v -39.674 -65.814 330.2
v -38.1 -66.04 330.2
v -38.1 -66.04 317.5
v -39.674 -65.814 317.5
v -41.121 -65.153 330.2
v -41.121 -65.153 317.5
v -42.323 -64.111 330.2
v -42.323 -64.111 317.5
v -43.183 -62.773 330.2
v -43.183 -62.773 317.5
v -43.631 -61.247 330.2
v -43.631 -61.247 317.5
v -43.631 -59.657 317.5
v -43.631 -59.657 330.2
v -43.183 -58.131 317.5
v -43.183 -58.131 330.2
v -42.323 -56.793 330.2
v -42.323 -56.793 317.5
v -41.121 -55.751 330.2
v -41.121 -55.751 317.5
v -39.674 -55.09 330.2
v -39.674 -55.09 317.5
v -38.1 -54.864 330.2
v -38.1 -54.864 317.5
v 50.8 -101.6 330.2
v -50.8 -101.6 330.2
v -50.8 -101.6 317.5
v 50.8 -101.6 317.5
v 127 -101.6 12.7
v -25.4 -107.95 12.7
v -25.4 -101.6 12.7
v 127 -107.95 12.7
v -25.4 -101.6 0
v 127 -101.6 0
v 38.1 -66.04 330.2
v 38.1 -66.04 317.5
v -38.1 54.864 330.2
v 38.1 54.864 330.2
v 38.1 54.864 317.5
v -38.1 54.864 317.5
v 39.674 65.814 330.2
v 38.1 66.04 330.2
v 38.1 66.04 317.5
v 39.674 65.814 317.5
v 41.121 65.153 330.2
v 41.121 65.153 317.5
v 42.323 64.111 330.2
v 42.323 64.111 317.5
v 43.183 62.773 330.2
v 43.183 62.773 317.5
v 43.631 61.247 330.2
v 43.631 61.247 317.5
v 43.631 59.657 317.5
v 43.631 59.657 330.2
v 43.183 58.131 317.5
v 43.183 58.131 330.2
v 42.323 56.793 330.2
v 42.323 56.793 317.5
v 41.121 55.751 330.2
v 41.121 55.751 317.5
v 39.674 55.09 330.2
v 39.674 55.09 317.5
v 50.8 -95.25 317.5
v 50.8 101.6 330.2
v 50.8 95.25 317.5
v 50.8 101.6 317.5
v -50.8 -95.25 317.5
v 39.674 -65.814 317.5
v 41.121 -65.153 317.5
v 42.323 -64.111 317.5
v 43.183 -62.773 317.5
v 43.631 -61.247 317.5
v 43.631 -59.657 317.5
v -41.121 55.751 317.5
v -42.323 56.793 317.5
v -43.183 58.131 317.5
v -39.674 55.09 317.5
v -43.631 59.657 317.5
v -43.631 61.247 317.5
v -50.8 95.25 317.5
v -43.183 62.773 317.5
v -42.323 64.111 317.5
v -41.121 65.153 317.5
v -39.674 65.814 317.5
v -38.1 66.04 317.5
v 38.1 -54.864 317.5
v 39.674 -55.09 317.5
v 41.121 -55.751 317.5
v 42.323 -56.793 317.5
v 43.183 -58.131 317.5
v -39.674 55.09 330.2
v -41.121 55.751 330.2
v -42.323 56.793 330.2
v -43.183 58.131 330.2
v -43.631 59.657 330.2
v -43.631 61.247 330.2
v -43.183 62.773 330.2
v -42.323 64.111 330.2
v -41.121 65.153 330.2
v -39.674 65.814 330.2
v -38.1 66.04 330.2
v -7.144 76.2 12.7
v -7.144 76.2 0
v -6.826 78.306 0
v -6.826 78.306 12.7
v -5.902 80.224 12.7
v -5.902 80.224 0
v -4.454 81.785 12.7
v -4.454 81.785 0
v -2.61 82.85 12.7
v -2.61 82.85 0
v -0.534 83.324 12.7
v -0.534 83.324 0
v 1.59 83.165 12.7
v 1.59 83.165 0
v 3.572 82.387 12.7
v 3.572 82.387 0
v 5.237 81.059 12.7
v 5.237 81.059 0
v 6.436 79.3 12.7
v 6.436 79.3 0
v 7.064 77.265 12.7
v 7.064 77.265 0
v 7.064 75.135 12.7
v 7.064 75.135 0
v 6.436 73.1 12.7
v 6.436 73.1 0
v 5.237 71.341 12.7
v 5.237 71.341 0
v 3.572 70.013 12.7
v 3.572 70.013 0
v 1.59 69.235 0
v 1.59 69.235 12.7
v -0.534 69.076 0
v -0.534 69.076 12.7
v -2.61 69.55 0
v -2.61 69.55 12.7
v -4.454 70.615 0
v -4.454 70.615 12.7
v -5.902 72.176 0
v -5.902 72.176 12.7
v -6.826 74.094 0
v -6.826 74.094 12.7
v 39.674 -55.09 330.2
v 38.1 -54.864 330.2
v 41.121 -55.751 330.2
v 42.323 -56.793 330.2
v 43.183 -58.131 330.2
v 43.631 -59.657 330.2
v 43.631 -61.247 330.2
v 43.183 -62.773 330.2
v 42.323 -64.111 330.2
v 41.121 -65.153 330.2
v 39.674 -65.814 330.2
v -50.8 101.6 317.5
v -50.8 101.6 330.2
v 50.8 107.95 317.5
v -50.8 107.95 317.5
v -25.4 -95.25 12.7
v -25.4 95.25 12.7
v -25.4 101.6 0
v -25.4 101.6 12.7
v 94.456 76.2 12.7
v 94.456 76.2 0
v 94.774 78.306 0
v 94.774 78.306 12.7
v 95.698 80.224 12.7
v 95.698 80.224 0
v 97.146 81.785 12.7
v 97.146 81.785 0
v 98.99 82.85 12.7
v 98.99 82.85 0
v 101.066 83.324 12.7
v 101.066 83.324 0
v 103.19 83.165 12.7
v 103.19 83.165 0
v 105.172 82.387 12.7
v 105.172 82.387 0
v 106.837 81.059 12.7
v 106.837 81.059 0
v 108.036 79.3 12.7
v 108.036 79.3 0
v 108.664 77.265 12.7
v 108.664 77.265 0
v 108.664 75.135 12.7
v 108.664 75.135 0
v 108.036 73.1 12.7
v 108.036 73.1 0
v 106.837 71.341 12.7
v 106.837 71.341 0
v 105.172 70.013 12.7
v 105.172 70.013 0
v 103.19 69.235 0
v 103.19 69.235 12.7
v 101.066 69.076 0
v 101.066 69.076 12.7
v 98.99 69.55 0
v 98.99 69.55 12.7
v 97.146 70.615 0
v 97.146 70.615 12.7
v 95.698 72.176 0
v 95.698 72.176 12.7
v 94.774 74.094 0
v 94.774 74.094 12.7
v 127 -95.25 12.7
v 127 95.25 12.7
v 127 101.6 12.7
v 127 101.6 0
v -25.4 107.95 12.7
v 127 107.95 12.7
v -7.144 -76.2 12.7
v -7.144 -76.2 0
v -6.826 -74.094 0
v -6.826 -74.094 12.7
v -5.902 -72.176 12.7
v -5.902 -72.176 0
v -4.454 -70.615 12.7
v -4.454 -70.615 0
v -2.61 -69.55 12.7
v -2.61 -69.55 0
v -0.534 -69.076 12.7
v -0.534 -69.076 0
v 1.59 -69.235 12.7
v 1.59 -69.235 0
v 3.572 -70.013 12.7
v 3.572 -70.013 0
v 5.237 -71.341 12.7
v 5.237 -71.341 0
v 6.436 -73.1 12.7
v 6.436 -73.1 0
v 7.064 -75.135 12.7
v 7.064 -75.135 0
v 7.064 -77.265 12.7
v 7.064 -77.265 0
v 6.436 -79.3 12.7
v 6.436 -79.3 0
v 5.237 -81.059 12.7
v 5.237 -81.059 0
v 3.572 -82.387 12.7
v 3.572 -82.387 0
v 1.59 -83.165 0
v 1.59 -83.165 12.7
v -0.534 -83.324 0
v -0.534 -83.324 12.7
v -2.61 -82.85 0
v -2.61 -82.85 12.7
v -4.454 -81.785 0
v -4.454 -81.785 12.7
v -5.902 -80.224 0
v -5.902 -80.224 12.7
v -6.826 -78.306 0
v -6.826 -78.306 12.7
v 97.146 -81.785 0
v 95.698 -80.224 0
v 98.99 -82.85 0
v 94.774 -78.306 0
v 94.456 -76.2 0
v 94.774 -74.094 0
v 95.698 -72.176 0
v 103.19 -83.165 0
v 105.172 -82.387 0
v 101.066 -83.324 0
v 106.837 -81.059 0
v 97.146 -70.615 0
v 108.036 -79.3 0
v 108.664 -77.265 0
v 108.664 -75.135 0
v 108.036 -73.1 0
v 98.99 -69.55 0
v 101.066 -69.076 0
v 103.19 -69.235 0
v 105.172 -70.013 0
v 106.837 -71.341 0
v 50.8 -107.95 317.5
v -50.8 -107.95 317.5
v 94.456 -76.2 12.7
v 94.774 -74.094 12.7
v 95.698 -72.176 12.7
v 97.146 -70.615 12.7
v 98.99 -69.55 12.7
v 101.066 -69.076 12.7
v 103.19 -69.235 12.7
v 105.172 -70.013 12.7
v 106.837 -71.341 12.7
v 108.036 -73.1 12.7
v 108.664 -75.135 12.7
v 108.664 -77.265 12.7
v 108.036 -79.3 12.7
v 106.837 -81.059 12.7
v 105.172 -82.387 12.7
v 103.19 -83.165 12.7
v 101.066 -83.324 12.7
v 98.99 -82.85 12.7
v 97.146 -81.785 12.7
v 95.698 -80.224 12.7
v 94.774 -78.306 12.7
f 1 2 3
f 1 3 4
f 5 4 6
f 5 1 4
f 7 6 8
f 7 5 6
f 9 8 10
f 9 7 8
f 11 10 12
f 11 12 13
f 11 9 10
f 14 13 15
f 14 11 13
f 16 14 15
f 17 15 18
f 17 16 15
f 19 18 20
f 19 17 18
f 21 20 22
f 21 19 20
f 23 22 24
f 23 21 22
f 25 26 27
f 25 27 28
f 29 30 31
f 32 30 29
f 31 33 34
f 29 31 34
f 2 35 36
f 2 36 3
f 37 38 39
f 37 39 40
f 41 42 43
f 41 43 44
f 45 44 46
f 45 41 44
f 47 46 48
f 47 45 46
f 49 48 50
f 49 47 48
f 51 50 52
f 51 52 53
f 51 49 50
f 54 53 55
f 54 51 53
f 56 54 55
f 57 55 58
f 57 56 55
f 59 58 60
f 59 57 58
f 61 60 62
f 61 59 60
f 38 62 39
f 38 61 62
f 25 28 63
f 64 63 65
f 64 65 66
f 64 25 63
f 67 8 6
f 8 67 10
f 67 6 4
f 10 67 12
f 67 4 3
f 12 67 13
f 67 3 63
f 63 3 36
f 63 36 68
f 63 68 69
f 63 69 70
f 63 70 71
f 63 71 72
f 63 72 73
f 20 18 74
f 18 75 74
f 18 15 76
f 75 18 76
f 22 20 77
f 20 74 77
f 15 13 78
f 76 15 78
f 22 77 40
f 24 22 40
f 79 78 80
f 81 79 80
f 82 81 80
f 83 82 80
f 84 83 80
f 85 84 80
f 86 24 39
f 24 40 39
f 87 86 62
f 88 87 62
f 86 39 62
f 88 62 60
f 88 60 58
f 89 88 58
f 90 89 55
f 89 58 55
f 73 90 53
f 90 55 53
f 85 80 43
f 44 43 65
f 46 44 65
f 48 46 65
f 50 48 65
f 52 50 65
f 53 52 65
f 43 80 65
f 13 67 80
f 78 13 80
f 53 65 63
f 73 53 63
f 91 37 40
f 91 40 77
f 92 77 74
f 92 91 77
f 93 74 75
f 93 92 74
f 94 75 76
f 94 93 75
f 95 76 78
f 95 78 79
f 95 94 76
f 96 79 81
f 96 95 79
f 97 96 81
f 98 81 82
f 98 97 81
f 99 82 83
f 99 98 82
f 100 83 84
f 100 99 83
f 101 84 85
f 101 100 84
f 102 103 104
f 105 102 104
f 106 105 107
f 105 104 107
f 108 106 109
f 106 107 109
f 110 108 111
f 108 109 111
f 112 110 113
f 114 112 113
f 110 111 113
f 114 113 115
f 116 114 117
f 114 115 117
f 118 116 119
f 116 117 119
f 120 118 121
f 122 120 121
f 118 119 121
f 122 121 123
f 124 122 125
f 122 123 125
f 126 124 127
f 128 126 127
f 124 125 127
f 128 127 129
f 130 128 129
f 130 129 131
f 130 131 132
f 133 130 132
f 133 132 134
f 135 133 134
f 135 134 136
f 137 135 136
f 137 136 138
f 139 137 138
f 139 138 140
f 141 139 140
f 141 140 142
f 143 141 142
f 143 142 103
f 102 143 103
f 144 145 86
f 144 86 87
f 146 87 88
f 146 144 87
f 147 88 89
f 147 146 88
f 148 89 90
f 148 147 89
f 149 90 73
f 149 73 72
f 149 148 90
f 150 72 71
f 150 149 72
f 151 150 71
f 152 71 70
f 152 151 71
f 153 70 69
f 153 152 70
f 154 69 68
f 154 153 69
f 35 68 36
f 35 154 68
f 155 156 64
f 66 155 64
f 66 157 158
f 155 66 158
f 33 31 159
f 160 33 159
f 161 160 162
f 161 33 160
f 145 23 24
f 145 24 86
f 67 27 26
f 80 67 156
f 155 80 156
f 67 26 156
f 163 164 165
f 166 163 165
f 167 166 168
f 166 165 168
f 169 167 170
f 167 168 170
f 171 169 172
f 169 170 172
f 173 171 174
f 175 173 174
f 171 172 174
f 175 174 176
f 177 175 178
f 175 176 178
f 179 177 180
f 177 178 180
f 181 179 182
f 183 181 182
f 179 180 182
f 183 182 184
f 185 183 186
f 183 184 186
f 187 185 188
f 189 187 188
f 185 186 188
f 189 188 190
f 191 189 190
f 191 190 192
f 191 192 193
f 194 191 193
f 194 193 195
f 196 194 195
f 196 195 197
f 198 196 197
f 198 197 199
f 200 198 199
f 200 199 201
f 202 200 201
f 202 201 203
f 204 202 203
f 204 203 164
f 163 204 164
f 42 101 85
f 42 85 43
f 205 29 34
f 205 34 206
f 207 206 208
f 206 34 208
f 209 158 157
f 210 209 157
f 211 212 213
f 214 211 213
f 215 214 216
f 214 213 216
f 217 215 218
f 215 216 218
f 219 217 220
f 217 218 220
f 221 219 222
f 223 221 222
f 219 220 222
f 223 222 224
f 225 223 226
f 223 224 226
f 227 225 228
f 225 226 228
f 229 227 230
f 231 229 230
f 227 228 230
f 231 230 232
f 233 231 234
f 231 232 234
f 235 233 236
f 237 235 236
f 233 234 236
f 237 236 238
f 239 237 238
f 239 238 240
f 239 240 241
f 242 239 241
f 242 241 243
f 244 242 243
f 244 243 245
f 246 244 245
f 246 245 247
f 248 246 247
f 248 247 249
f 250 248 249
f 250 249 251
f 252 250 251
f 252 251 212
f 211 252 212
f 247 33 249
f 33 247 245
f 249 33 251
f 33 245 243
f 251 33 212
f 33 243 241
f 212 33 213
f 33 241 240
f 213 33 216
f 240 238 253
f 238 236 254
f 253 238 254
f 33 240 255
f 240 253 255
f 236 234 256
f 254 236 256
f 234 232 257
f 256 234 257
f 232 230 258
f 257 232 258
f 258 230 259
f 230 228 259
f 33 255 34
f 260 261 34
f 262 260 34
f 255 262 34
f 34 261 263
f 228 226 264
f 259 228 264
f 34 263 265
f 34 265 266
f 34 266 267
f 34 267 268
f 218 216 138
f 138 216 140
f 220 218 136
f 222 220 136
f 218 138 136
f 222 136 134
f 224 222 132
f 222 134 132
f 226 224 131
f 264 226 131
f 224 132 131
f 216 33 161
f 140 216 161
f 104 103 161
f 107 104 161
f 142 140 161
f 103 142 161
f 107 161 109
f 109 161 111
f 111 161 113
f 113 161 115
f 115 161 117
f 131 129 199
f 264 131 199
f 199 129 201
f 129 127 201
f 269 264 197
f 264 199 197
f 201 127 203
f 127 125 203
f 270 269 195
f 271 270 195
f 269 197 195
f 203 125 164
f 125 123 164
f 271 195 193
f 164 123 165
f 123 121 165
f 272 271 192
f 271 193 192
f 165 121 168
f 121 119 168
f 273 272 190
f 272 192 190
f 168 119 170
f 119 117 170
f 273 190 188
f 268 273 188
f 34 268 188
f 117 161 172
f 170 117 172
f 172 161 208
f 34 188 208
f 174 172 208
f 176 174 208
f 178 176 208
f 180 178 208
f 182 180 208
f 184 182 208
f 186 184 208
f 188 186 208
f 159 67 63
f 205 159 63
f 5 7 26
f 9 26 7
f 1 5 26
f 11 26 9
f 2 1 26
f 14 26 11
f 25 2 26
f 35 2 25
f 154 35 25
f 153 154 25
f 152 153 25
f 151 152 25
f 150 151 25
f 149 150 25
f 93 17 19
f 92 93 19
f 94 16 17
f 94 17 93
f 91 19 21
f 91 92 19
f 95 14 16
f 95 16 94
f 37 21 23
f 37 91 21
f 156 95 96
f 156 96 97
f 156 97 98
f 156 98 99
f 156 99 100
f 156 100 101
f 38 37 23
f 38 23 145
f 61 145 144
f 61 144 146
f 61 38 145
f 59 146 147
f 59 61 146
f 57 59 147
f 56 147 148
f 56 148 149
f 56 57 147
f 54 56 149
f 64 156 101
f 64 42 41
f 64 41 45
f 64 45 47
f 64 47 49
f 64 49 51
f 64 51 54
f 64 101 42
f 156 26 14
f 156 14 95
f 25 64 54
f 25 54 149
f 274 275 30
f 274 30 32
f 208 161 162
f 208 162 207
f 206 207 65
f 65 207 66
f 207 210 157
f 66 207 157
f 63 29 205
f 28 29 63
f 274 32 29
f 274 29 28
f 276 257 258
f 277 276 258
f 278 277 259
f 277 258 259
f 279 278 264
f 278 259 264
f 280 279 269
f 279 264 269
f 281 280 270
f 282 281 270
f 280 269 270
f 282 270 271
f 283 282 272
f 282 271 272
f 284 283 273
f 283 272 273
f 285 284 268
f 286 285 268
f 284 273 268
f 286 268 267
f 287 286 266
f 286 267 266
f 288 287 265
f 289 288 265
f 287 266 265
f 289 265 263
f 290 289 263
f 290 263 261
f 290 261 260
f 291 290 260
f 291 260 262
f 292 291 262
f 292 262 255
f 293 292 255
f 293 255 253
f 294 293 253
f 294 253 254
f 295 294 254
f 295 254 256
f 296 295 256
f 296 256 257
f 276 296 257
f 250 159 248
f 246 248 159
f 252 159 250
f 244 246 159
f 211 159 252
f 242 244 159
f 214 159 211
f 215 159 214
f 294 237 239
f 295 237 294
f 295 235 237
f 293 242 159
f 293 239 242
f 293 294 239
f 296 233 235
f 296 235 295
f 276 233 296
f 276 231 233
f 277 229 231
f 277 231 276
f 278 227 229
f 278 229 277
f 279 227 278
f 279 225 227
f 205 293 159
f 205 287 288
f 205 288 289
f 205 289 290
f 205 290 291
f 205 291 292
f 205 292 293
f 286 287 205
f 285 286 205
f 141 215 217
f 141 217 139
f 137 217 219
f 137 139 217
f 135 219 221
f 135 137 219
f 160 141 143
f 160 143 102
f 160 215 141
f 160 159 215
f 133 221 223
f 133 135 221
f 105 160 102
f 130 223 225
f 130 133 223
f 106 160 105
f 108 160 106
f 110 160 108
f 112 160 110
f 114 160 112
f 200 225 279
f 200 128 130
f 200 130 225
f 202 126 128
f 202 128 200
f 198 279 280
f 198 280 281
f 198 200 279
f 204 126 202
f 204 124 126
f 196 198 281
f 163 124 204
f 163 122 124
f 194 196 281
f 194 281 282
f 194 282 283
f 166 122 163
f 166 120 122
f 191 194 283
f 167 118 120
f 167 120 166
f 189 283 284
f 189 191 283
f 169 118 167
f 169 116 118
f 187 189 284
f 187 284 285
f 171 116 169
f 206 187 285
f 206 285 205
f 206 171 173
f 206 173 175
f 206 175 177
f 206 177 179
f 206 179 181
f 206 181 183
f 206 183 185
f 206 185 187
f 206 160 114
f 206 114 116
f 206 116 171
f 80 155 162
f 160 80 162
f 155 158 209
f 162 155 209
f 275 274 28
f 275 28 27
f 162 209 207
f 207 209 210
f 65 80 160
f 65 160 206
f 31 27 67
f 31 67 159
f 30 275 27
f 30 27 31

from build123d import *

# Parameters (mm, degrees)
F1_W     = 101.6
F1_H     = 203.2
F2_DEPTH = 12.7
F3_W     = 152.4
F3_H     = 203.2
F4_DEPTH = 12.7
F6_D     = 14.2875
F6_DEPTH = 50.8
F6_TIP   = 4.2923980472
F8_DEPTH = 6.35


# Not quite as in the source:
# - a length typed as a fraction of an inch, garbled in the dataset ("3 / 203.2 mm" for 3/8 in), is restored


with BuildPart() as f2:
    # F1 (on offset) → F2 (new body)
    with BuildSketch(Plane.XY.offset(330.2)):
        Rectangle(F1_W, F1_H)
        with BuildLine():
            ThreePointArc((-38.1, -66.04), (-43.688, -60.452), (-38.1, -54.864))
            Line((-38.1, -54.864), (38.1, -54.864))
            ThreePointArc((38.1, -54.864), (43.688, -60.452), (38.1, -66.04))
            Line((38.1, -66.04), (-38.1, -66.04))
        make_face(mode=Mode.SUBTRACT)
        with BuildLine():
            Line((38.1, 54.864), (-38.1, 54.864))
            ThreePointArc((-38.1, 54.864), (-43.688, 60.452), (-38.1, 66.04))
            Line((-38.1, 66.04), (38.1, 66.04))
            ThreePointArc((38.1, 66.04), (43.688, 60.452), (38.1, 54.864))
        make_face(mode=Mode.SUBTRACT)
    extrude(amount=-F2_DEPTH)



with BuildPart() as f4:
    # F3 (on Top) → F4 (new body)
    with BuildSketch(Plane.XY):
        with Locations((50.8, 0)):
            Rectangle(F3_W, F3_H)
    extrude(amount=F4_DEPTH)

    # F6
    with Locations(Plane.XY.offset(12.7)):
        with Locations((0, 76.2), (101.6, 76.2), (0, -76.2), (101.6, -76.2)):
            Hole(F6_D / 2, depth=F6_DEPTH)
            with Locations((0, 0, -(F6_DEPTH + F6_TIP / 2))):  # 118° drill point
                Cone(0, F6_D / 2, F6_TIP, mode=Mode.SUBTRACT)


with BuildPart() as f2_1:
    add(f2.part)

    add(f4.part)  # F8 merges F4
    # F7 (on face) → F8 (join, symmetric)
    with BuildSketch(Plane.XZ.offset(101.6)):
        Polygon((50.8, 317.5), (-50.8, 317.5), (-25.4, 12.7), (127, 12.7), align=None)
    extrude(amount=F8_DEPTH, both=True)

    # F9: F2 across plane


with BuildPart() as f2_2:
    add(f2_1.part)
    add(f2_1.part.mirror(Plane.XZ))


solid = f2_2.part
